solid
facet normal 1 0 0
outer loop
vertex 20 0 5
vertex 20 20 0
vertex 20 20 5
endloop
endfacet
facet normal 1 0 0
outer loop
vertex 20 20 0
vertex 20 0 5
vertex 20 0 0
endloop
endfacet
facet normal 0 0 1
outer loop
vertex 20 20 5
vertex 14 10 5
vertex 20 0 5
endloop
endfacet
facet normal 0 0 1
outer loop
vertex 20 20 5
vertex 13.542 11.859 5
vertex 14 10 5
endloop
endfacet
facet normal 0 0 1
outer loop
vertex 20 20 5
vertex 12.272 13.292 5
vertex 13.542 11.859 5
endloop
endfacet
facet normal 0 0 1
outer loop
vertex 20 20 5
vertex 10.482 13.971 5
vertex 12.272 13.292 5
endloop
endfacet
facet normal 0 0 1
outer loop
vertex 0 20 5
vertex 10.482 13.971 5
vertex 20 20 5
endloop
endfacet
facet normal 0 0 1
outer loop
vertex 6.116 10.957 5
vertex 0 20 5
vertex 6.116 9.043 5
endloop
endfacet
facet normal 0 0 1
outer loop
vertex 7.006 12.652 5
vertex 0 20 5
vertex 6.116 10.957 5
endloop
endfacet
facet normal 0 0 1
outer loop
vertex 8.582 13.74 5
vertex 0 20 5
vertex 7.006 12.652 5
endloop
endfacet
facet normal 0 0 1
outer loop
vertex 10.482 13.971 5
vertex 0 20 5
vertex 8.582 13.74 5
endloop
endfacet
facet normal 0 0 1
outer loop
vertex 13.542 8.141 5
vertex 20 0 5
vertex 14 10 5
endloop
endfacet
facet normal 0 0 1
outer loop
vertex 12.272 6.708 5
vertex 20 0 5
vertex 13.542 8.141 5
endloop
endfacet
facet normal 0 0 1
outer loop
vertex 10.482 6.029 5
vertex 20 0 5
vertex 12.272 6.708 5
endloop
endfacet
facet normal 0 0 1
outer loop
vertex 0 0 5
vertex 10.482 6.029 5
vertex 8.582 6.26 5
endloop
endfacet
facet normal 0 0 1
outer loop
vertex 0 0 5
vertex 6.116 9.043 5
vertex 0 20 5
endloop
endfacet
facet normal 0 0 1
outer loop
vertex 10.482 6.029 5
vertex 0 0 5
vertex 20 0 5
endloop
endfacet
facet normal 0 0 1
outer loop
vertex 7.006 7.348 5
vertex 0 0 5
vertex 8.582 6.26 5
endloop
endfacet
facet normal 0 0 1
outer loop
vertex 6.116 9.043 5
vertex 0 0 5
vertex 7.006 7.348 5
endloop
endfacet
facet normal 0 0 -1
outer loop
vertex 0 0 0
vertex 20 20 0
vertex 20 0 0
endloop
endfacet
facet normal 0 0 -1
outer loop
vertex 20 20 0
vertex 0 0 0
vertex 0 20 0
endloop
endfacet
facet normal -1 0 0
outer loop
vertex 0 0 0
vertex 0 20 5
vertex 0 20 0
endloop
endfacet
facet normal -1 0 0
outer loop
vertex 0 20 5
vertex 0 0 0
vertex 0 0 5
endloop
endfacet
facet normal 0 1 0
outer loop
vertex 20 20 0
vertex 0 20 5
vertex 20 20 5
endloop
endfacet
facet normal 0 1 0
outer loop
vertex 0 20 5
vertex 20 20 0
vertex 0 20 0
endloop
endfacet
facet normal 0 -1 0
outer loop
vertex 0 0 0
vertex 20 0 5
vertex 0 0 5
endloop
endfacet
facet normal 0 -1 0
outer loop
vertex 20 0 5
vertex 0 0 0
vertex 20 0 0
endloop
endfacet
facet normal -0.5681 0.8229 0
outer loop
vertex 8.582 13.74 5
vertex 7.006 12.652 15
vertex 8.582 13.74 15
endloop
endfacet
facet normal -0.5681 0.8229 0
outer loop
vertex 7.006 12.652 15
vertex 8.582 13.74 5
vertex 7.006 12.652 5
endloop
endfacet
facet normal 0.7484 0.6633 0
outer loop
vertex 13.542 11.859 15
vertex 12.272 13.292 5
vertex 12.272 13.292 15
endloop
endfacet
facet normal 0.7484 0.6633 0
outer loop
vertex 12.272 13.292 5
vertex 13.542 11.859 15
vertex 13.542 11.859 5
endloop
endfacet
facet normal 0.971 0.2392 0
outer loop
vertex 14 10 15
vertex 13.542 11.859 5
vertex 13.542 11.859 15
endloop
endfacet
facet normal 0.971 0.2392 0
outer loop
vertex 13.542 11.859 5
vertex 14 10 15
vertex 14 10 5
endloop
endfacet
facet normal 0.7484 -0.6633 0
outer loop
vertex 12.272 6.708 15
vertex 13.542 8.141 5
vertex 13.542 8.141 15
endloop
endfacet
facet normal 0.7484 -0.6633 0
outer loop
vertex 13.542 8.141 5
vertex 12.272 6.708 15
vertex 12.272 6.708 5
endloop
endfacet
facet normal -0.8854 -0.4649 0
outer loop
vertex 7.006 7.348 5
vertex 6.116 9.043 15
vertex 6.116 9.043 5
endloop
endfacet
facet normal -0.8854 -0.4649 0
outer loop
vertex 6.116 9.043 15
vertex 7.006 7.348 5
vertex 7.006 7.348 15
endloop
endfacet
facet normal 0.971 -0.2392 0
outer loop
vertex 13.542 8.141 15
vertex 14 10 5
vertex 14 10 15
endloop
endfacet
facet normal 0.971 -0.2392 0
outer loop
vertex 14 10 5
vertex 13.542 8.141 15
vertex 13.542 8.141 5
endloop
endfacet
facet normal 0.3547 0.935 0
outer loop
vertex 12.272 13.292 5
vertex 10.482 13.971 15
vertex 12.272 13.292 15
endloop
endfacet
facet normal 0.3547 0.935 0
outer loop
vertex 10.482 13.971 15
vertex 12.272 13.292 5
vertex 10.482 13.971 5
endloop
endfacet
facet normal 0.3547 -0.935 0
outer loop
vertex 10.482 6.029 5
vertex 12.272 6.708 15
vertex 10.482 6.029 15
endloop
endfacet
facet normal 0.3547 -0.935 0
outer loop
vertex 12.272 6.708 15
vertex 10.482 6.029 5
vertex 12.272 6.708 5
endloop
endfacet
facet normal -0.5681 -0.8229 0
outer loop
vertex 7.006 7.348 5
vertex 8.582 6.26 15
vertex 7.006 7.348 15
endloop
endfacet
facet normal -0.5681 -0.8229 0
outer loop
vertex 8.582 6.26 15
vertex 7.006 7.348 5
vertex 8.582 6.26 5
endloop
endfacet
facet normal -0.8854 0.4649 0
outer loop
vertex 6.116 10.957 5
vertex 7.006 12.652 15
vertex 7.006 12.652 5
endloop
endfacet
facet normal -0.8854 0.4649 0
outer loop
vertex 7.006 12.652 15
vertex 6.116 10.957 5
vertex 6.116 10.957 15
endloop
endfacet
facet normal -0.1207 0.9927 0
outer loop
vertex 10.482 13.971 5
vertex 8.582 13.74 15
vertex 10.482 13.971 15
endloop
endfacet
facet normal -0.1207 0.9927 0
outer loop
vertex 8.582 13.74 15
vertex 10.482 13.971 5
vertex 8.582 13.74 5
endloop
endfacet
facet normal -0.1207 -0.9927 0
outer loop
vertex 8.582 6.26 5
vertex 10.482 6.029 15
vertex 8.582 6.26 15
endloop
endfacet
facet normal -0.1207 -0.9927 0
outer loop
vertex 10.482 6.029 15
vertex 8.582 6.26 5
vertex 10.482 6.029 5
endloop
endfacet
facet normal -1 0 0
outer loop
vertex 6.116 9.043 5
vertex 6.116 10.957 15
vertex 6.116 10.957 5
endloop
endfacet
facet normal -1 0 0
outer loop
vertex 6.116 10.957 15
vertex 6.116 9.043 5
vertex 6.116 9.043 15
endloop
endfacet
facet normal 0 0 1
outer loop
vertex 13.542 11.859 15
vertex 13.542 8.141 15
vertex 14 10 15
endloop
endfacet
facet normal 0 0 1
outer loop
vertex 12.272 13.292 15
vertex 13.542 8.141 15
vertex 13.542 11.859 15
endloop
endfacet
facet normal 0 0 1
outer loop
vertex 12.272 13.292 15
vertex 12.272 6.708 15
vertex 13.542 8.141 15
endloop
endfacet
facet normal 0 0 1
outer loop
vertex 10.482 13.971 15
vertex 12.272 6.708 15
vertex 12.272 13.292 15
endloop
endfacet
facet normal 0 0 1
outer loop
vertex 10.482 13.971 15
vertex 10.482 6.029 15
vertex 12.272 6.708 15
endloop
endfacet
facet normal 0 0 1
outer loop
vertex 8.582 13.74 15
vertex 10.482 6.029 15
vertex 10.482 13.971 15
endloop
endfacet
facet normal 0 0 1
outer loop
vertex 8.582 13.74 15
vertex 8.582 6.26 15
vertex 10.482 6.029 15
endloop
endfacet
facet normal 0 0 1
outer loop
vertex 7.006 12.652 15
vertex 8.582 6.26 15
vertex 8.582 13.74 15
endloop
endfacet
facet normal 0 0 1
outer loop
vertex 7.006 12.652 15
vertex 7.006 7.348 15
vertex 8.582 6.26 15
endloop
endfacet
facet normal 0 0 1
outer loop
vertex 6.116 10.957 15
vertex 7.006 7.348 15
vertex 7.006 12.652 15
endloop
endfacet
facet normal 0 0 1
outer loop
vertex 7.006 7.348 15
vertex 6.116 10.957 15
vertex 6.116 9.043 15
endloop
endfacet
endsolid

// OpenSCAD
union(fillet = 2) { color("red") cube([20,20,5]); color("blue") translate([10,10,0]) cylinder(h = 15, r = 4); }
